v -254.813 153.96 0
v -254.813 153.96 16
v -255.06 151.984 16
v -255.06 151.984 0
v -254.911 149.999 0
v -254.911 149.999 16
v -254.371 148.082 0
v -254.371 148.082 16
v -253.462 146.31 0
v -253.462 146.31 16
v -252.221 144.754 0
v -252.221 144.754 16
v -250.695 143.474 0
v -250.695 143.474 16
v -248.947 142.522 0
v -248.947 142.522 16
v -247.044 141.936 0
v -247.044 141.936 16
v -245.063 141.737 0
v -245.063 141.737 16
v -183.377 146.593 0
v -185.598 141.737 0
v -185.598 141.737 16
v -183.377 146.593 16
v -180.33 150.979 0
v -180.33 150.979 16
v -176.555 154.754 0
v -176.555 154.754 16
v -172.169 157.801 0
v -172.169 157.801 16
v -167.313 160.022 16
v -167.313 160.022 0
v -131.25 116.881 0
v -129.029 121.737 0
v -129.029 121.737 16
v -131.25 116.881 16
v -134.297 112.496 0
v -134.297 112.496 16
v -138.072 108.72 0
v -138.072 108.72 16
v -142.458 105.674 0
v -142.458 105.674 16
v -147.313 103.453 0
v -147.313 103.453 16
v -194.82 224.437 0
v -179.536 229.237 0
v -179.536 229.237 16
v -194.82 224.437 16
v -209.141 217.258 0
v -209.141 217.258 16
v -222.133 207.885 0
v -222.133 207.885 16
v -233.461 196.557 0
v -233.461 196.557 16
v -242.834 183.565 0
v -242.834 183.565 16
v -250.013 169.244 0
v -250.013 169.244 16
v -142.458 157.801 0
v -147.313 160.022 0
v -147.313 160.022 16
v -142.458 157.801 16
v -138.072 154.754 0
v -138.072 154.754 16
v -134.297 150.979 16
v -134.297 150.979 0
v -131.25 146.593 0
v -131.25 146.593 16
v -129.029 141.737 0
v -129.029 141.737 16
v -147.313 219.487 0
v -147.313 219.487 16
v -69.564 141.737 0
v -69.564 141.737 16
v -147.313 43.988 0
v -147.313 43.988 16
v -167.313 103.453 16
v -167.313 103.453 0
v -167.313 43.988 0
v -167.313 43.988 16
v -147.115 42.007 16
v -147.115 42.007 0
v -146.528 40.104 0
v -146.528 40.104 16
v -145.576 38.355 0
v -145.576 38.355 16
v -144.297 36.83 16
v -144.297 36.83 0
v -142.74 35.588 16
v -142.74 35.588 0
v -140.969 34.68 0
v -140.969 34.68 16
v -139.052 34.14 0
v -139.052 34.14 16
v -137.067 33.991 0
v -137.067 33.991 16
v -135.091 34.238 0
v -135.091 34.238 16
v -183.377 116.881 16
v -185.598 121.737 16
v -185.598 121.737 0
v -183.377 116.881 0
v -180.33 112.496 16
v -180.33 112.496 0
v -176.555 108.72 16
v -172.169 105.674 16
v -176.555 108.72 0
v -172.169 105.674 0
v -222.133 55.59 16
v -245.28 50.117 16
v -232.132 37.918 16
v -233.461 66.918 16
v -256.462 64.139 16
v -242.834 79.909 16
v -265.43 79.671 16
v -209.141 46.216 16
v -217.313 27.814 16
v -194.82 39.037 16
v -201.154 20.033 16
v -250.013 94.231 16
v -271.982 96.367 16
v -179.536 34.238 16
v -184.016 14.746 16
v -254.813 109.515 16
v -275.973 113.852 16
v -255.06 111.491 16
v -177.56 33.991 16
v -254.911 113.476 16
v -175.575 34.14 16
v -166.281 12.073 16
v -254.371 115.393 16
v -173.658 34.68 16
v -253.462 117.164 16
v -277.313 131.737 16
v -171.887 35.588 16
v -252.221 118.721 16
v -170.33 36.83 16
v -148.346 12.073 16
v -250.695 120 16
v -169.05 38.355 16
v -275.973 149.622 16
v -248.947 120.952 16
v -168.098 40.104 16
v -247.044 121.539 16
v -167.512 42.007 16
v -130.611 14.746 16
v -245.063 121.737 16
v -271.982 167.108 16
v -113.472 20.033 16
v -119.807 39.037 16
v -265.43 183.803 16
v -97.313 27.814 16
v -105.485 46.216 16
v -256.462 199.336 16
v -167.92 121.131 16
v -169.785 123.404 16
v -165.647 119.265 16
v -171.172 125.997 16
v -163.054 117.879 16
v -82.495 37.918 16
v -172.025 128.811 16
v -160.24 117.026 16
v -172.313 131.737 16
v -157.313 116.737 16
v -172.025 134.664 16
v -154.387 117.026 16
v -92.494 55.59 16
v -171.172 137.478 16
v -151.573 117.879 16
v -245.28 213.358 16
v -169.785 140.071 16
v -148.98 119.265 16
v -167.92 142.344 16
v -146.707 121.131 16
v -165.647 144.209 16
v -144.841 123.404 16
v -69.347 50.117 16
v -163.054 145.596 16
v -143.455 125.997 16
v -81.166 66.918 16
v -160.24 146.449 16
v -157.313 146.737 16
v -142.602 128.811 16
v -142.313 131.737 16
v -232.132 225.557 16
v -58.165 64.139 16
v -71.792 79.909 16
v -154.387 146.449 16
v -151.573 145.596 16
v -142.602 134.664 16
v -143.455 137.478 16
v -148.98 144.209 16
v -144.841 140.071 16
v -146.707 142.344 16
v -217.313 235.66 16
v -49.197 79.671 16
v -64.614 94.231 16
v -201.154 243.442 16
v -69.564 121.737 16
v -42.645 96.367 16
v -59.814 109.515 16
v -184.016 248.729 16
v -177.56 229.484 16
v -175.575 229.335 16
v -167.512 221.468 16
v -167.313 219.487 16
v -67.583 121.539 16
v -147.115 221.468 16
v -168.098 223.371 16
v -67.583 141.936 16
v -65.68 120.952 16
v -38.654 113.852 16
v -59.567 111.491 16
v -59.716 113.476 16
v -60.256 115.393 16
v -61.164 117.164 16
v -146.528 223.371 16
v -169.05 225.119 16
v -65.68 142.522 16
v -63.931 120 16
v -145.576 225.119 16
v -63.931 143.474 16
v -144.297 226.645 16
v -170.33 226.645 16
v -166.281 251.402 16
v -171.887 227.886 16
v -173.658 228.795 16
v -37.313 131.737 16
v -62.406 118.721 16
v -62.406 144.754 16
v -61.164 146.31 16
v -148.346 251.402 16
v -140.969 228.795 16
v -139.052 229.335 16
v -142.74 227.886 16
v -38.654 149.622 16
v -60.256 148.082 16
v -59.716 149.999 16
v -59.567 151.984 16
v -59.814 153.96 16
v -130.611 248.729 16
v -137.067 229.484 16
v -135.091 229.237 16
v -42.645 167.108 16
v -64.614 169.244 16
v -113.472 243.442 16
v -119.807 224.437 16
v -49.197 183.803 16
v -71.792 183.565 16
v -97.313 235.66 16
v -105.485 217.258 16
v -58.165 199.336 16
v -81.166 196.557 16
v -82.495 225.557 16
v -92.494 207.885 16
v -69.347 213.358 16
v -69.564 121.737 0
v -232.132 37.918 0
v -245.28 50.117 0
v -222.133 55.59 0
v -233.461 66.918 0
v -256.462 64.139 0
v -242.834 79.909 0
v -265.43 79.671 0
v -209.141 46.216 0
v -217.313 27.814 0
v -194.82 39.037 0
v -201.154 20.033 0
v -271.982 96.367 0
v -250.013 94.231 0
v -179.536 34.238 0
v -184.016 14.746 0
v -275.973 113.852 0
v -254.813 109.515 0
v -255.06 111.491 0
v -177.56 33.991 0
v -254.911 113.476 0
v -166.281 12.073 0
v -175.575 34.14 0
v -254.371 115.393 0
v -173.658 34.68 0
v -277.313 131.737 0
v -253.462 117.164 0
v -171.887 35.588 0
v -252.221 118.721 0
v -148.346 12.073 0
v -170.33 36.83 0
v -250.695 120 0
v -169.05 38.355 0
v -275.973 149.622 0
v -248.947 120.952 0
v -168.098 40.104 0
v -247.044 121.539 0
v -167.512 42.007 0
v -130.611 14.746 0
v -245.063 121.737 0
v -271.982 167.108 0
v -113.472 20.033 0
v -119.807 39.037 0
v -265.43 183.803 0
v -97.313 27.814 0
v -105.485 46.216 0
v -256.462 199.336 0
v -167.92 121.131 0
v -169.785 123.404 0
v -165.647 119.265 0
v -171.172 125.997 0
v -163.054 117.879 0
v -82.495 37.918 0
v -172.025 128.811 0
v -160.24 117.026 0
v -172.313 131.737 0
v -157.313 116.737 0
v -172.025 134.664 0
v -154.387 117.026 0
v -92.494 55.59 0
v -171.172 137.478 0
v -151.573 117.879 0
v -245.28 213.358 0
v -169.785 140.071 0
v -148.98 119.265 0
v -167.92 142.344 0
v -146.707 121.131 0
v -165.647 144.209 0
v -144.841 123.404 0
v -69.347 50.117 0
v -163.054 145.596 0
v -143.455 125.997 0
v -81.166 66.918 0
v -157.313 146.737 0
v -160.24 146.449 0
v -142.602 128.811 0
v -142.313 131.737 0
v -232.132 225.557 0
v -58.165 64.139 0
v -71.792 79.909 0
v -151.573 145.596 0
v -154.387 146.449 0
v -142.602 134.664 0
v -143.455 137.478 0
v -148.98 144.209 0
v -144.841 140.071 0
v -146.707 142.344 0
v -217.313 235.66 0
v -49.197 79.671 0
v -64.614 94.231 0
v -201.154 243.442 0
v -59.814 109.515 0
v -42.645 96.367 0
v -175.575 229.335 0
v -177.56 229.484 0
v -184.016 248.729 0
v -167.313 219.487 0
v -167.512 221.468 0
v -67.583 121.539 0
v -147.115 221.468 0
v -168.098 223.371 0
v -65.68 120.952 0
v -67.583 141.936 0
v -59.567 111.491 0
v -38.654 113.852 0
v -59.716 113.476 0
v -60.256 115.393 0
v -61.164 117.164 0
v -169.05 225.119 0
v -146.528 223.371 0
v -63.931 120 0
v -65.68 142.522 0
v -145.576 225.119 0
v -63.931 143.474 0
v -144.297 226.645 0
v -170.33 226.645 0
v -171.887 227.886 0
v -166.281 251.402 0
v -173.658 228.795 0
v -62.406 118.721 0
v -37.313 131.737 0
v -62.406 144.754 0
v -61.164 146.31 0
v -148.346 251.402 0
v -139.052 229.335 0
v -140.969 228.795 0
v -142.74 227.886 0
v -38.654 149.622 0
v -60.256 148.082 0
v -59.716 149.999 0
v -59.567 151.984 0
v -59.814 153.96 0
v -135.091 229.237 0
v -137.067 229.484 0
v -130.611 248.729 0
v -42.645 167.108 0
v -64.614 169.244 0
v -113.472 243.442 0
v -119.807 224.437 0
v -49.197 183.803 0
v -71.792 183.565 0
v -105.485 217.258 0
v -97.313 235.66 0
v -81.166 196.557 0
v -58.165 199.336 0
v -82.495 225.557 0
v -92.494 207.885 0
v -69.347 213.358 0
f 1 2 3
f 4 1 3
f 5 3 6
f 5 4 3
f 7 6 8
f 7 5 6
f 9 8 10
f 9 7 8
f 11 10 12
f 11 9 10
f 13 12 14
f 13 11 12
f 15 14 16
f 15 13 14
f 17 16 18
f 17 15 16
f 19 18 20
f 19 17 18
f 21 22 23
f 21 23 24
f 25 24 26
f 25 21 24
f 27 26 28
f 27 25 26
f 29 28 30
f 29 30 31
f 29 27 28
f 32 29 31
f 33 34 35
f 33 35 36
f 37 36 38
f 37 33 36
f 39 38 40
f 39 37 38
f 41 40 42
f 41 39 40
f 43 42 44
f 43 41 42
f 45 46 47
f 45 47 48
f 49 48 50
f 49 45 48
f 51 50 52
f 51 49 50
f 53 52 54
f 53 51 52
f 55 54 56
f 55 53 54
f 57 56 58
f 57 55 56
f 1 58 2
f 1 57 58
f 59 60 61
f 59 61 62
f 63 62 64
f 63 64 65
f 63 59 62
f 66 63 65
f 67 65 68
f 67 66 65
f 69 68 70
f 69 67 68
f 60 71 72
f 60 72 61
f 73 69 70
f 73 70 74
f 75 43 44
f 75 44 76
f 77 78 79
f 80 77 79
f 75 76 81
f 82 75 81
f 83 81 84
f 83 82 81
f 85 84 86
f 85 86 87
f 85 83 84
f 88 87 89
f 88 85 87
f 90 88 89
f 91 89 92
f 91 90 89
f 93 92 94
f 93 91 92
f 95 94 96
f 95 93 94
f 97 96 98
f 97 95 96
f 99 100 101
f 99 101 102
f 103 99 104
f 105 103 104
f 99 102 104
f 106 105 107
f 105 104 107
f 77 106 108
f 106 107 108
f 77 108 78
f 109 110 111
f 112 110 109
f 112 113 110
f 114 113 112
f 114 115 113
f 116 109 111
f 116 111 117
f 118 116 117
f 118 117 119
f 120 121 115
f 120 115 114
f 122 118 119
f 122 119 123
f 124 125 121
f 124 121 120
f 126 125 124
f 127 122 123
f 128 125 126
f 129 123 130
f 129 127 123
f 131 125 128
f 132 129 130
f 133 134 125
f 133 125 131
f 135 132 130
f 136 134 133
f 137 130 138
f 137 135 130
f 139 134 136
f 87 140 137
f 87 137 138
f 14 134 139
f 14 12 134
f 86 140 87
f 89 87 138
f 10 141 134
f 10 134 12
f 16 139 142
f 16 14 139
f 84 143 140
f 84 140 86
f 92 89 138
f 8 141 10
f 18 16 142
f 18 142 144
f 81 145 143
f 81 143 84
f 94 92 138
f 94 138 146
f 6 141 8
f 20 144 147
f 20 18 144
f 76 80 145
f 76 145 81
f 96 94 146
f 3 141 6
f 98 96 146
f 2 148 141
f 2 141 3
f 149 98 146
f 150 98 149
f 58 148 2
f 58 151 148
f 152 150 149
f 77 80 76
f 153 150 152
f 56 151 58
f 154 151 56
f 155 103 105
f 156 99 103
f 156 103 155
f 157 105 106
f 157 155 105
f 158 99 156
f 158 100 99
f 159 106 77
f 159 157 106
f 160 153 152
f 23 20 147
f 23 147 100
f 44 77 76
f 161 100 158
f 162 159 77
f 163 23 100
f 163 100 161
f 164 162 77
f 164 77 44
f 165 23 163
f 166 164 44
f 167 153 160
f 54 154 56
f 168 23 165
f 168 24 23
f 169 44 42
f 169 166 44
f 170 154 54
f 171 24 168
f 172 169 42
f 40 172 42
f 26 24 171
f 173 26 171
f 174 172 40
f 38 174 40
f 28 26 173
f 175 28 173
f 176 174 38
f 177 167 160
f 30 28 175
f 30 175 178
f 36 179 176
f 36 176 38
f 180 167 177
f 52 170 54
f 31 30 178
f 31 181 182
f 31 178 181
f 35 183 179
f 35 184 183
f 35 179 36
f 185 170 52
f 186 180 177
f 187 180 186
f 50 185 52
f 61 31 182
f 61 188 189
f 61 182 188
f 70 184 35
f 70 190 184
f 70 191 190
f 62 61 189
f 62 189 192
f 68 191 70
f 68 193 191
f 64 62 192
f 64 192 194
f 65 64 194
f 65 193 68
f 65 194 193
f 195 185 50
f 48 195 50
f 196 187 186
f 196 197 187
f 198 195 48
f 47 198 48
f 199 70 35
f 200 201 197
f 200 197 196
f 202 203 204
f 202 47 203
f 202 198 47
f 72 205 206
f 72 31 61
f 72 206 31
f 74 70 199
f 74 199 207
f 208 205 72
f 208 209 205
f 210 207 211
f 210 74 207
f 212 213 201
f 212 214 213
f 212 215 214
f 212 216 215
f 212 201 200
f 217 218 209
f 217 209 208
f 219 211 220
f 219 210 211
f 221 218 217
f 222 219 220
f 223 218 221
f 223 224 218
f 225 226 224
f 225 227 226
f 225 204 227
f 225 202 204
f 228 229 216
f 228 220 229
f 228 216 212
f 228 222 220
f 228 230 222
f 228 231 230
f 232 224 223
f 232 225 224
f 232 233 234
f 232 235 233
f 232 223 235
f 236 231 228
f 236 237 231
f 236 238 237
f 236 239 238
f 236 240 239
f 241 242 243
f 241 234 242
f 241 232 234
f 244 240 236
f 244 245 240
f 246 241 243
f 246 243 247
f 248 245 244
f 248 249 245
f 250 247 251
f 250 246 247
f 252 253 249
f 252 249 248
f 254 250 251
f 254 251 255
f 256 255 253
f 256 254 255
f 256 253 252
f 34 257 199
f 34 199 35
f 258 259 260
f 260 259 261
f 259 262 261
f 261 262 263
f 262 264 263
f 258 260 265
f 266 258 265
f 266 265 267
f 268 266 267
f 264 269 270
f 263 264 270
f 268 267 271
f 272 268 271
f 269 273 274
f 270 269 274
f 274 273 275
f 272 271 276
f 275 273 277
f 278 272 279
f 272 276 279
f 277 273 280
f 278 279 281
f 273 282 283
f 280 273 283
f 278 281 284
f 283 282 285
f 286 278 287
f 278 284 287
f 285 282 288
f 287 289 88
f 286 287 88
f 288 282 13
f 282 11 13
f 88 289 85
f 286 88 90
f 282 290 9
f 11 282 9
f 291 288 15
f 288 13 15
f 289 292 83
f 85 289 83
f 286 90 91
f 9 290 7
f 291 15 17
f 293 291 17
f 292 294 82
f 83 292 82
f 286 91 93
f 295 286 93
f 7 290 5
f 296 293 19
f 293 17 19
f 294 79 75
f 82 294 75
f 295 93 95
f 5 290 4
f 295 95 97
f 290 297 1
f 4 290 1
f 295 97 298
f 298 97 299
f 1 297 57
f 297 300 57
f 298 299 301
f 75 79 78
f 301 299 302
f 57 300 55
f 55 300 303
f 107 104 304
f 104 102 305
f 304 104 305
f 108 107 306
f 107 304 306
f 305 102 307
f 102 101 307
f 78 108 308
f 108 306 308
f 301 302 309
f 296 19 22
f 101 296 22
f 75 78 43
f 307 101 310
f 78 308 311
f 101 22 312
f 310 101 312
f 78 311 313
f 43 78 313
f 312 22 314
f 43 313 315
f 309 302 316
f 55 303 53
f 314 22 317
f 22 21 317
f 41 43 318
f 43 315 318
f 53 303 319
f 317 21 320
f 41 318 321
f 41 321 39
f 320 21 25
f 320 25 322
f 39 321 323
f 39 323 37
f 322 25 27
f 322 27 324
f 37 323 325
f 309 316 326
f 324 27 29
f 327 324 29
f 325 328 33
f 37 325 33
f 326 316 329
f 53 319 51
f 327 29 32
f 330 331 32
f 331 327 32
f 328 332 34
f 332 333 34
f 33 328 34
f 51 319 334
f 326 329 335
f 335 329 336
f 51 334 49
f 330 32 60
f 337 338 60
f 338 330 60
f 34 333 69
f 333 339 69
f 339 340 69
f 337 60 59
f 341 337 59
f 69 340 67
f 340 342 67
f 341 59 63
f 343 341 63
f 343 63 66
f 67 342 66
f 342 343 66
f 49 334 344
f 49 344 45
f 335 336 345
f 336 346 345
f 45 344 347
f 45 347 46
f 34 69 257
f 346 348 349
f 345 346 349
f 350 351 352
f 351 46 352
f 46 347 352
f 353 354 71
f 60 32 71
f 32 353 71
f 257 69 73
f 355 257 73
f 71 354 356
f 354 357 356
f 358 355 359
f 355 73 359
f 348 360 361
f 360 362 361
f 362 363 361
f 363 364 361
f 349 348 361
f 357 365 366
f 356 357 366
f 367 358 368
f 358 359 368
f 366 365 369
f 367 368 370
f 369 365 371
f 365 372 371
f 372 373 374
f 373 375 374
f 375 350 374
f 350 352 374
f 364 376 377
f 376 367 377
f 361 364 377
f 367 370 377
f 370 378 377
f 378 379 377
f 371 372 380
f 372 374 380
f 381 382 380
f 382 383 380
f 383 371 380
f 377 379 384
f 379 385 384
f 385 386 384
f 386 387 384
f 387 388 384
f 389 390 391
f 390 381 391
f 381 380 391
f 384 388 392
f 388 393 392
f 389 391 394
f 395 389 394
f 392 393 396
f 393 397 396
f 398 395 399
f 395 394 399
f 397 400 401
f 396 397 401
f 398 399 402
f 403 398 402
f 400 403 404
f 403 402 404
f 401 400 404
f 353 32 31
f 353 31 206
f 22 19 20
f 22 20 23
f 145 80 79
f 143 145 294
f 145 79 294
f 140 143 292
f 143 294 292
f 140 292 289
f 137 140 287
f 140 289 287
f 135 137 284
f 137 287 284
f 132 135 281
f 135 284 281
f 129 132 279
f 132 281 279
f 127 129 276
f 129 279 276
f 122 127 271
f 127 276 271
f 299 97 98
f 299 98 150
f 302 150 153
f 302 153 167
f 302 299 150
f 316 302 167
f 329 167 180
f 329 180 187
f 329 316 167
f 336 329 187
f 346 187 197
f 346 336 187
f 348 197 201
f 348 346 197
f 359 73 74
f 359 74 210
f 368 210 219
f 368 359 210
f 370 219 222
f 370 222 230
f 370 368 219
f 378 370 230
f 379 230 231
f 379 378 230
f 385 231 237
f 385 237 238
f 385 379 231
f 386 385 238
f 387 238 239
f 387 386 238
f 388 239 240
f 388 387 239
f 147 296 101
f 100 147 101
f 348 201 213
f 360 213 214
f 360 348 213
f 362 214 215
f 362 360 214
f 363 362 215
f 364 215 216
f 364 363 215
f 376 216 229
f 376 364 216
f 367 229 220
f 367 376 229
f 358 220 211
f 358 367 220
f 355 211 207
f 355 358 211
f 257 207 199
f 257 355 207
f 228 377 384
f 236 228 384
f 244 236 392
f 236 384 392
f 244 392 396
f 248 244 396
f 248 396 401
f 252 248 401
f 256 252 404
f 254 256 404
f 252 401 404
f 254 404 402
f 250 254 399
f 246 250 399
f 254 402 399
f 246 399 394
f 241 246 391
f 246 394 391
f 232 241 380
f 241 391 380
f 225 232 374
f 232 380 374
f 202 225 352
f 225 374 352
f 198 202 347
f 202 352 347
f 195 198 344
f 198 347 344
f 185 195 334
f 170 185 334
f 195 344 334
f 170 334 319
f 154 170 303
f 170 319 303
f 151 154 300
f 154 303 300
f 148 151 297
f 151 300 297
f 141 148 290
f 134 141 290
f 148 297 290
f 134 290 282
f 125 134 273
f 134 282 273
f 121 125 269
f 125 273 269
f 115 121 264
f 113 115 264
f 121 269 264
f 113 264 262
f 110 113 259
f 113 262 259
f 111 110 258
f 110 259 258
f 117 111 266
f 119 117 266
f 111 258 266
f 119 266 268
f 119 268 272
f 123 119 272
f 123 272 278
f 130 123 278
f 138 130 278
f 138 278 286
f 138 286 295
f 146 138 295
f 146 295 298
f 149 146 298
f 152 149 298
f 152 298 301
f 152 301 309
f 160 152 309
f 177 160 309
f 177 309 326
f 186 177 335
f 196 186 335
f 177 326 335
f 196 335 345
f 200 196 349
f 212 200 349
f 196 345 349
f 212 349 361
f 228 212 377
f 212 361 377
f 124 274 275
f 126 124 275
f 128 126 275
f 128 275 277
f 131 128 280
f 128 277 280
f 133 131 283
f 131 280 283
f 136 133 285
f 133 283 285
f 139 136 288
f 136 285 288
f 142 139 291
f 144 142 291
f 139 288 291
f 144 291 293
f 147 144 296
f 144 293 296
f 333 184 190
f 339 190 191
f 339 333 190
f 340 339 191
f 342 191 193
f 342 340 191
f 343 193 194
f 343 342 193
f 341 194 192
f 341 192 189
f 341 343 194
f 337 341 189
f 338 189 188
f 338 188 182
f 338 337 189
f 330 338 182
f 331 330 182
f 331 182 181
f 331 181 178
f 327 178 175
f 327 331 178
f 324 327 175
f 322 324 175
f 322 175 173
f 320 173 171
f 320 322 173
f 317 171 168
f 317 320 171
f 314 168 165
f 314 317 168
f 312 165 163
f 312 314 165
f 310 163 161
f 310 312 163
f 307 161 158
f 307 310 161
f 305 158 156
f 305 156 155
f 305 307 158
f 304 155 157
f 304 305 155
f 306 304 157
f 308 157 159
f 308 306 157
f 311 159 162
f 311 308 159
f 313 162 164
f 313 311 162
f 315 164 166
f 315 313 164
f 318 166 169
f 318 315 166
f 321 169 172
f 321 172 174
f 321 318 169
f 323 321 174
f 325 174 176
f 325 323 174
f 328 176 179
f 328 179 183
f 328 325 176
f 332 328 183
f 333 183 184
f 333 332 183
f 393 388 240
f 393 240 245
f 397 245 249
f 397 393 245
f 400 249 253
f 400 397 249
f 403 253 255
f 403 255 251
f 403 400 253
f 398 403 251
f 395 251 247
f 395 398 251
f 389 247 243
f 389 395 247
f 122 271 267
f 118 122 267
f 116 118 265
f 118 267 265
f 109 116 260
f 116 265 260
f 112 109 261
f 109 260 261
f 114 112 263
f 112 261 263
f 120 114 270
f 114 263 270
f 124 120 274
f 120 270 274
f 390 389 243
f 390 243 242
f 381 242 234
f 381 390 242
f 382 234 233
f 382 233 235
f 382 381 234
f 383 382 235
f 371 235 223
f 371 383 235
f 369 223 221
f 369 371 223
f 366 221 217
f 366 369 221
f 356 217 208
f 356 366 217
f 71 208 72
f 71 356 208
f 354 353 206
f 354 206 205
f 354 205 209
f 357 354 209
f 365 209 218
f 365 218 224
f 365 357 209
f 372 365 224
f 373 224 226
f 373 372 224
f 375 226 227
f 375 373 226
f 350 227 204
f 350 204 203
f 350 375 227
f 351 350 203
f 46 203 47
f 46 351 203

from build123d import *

# Parameters (mm, degrees)
SKETCH1_R           = 120
SKETCH1_R_2         = 15
BOSS_EXTRUDE1_DEPTH = 16


with BuildPart() as part:
    # Sketch1 → Boss-Extrude1 (new body)
    with BuildSketch(Plane.XY):
        with Locations((-157.313413121, 131.73738084)):
            Circle(SKETCH1_R)
        with Locations((-157.313413121, 131.73738084)):
            Circle(SKETCH1_R_2, mode=Mode.SUBTRACT)
        with BuildLine():
            Line((-167.313413121, 103.453109593), (-167.313413121, 43.987736967))
            ThreePointArc((-167.313413121, 43.987736967), (-171.077317476, 36.170377367), (-179.535635343, 34.237776536))
            ThreePointArc((-179.535635343, 34.237776536), (-228.024091239, 61.026702722), (-254.813017425, 109.515158618))
            ThreePointArc((-254.813017425, 109.515158618), (-252.880416594, 117.973476485), (-245.063056995, 121.73738084))
            Line((-245.063056995, 121.73738084), (-185.597684368, 121.73738084))
            ThreePointArc((-185.597684368, 121.73738084), (-178.526616556, 110.524177405), (-167.313413121, 103.453109593))
        make_face(mode=Mode.SUBTRACT)
        with BuildLine():
            Line((-245.063056995, 141.73738084), (-185.597684368, 141.73738084))
            ThreePointArc((-185.597684368, 141.73738084), (-178.526616556, 152.950584276), (-167.313413121, 160.021652088))
            Line((-167.313413121, 160.021652088), (-167.313413121, 219.487024714))
            ThreePointArc((-167.313413121, 219.487024714), (-171.077317476, 227.304384314), (-179.535635343, 229.236985145))
            ThreePointArc((-179.535635343, 229.236985145), (-228.024091239, 202.448058959), (-254.813017425, 153.959603063))
            ThreePointArc((-254.813017425, 153.959603063), (-252.880416594, 145.501285196), (-245.063056995, 141.73738084))
        make_face(mode=Mode.SUBTRACT)
        with BuildLine():
            Line((-147.313413121, 219.487024714), (-147.313413121, 160.021652088))
            ThreePointArc((-147.313413121, 160.021652088), (-136.100209685, 152.950584276), (-129.029141873, 141.73738084))
            Line((-129.029141873, 141.73738084), (-69.563769247, 141.73738084))
            ThreePointArc((-69.563769247, 141.73738084), (-61.746409647, 145.501285196), (-59.813808816, 153.959603063))
            ThreePointArc((-59.813808816, 153.959603063), (-86.602735002, 202.448058959), (-135.091190899, 229.236985145))
            ThreePointArc((-135.091190899, 229.236985145), (-143.549508765, 227.304384314), (-147.313413121, 219.487024714))
        make_face(mode=Mode.SUBTRACT)
        with BuildLine():
            Line((-147.313413121, 103.453109593), (-147.313413121, 43.987736967))
            ThreePointArc((-147.313413121, 43.987736967), (-143.549508765, 36.170377367), (-135.091190899, 34.237776536))
            ThreePointArc((-135.091190899, 34.237776536), (-86.602735002, 61.026702722), (-59.813808816, 109.515158618))
            ThreePointArc((-59.813808816, 109.515158618), (-61.746409647, 117.973476485), (-69.563769247, 121.73738084))
            Line((-69.563769247, 121.73738084), (-129.029141873, 121.73738084))
            ThreePointArc((-129.029141873, 121.73738084), (-136.100209685, 110.524177405), (-147.313413121, 103.453109593))
        make_face(mode=Mode.SUBTRACT)
    extrude(amount=BOSS_EXTRUDE1_DEPTH)


solid = part.part
